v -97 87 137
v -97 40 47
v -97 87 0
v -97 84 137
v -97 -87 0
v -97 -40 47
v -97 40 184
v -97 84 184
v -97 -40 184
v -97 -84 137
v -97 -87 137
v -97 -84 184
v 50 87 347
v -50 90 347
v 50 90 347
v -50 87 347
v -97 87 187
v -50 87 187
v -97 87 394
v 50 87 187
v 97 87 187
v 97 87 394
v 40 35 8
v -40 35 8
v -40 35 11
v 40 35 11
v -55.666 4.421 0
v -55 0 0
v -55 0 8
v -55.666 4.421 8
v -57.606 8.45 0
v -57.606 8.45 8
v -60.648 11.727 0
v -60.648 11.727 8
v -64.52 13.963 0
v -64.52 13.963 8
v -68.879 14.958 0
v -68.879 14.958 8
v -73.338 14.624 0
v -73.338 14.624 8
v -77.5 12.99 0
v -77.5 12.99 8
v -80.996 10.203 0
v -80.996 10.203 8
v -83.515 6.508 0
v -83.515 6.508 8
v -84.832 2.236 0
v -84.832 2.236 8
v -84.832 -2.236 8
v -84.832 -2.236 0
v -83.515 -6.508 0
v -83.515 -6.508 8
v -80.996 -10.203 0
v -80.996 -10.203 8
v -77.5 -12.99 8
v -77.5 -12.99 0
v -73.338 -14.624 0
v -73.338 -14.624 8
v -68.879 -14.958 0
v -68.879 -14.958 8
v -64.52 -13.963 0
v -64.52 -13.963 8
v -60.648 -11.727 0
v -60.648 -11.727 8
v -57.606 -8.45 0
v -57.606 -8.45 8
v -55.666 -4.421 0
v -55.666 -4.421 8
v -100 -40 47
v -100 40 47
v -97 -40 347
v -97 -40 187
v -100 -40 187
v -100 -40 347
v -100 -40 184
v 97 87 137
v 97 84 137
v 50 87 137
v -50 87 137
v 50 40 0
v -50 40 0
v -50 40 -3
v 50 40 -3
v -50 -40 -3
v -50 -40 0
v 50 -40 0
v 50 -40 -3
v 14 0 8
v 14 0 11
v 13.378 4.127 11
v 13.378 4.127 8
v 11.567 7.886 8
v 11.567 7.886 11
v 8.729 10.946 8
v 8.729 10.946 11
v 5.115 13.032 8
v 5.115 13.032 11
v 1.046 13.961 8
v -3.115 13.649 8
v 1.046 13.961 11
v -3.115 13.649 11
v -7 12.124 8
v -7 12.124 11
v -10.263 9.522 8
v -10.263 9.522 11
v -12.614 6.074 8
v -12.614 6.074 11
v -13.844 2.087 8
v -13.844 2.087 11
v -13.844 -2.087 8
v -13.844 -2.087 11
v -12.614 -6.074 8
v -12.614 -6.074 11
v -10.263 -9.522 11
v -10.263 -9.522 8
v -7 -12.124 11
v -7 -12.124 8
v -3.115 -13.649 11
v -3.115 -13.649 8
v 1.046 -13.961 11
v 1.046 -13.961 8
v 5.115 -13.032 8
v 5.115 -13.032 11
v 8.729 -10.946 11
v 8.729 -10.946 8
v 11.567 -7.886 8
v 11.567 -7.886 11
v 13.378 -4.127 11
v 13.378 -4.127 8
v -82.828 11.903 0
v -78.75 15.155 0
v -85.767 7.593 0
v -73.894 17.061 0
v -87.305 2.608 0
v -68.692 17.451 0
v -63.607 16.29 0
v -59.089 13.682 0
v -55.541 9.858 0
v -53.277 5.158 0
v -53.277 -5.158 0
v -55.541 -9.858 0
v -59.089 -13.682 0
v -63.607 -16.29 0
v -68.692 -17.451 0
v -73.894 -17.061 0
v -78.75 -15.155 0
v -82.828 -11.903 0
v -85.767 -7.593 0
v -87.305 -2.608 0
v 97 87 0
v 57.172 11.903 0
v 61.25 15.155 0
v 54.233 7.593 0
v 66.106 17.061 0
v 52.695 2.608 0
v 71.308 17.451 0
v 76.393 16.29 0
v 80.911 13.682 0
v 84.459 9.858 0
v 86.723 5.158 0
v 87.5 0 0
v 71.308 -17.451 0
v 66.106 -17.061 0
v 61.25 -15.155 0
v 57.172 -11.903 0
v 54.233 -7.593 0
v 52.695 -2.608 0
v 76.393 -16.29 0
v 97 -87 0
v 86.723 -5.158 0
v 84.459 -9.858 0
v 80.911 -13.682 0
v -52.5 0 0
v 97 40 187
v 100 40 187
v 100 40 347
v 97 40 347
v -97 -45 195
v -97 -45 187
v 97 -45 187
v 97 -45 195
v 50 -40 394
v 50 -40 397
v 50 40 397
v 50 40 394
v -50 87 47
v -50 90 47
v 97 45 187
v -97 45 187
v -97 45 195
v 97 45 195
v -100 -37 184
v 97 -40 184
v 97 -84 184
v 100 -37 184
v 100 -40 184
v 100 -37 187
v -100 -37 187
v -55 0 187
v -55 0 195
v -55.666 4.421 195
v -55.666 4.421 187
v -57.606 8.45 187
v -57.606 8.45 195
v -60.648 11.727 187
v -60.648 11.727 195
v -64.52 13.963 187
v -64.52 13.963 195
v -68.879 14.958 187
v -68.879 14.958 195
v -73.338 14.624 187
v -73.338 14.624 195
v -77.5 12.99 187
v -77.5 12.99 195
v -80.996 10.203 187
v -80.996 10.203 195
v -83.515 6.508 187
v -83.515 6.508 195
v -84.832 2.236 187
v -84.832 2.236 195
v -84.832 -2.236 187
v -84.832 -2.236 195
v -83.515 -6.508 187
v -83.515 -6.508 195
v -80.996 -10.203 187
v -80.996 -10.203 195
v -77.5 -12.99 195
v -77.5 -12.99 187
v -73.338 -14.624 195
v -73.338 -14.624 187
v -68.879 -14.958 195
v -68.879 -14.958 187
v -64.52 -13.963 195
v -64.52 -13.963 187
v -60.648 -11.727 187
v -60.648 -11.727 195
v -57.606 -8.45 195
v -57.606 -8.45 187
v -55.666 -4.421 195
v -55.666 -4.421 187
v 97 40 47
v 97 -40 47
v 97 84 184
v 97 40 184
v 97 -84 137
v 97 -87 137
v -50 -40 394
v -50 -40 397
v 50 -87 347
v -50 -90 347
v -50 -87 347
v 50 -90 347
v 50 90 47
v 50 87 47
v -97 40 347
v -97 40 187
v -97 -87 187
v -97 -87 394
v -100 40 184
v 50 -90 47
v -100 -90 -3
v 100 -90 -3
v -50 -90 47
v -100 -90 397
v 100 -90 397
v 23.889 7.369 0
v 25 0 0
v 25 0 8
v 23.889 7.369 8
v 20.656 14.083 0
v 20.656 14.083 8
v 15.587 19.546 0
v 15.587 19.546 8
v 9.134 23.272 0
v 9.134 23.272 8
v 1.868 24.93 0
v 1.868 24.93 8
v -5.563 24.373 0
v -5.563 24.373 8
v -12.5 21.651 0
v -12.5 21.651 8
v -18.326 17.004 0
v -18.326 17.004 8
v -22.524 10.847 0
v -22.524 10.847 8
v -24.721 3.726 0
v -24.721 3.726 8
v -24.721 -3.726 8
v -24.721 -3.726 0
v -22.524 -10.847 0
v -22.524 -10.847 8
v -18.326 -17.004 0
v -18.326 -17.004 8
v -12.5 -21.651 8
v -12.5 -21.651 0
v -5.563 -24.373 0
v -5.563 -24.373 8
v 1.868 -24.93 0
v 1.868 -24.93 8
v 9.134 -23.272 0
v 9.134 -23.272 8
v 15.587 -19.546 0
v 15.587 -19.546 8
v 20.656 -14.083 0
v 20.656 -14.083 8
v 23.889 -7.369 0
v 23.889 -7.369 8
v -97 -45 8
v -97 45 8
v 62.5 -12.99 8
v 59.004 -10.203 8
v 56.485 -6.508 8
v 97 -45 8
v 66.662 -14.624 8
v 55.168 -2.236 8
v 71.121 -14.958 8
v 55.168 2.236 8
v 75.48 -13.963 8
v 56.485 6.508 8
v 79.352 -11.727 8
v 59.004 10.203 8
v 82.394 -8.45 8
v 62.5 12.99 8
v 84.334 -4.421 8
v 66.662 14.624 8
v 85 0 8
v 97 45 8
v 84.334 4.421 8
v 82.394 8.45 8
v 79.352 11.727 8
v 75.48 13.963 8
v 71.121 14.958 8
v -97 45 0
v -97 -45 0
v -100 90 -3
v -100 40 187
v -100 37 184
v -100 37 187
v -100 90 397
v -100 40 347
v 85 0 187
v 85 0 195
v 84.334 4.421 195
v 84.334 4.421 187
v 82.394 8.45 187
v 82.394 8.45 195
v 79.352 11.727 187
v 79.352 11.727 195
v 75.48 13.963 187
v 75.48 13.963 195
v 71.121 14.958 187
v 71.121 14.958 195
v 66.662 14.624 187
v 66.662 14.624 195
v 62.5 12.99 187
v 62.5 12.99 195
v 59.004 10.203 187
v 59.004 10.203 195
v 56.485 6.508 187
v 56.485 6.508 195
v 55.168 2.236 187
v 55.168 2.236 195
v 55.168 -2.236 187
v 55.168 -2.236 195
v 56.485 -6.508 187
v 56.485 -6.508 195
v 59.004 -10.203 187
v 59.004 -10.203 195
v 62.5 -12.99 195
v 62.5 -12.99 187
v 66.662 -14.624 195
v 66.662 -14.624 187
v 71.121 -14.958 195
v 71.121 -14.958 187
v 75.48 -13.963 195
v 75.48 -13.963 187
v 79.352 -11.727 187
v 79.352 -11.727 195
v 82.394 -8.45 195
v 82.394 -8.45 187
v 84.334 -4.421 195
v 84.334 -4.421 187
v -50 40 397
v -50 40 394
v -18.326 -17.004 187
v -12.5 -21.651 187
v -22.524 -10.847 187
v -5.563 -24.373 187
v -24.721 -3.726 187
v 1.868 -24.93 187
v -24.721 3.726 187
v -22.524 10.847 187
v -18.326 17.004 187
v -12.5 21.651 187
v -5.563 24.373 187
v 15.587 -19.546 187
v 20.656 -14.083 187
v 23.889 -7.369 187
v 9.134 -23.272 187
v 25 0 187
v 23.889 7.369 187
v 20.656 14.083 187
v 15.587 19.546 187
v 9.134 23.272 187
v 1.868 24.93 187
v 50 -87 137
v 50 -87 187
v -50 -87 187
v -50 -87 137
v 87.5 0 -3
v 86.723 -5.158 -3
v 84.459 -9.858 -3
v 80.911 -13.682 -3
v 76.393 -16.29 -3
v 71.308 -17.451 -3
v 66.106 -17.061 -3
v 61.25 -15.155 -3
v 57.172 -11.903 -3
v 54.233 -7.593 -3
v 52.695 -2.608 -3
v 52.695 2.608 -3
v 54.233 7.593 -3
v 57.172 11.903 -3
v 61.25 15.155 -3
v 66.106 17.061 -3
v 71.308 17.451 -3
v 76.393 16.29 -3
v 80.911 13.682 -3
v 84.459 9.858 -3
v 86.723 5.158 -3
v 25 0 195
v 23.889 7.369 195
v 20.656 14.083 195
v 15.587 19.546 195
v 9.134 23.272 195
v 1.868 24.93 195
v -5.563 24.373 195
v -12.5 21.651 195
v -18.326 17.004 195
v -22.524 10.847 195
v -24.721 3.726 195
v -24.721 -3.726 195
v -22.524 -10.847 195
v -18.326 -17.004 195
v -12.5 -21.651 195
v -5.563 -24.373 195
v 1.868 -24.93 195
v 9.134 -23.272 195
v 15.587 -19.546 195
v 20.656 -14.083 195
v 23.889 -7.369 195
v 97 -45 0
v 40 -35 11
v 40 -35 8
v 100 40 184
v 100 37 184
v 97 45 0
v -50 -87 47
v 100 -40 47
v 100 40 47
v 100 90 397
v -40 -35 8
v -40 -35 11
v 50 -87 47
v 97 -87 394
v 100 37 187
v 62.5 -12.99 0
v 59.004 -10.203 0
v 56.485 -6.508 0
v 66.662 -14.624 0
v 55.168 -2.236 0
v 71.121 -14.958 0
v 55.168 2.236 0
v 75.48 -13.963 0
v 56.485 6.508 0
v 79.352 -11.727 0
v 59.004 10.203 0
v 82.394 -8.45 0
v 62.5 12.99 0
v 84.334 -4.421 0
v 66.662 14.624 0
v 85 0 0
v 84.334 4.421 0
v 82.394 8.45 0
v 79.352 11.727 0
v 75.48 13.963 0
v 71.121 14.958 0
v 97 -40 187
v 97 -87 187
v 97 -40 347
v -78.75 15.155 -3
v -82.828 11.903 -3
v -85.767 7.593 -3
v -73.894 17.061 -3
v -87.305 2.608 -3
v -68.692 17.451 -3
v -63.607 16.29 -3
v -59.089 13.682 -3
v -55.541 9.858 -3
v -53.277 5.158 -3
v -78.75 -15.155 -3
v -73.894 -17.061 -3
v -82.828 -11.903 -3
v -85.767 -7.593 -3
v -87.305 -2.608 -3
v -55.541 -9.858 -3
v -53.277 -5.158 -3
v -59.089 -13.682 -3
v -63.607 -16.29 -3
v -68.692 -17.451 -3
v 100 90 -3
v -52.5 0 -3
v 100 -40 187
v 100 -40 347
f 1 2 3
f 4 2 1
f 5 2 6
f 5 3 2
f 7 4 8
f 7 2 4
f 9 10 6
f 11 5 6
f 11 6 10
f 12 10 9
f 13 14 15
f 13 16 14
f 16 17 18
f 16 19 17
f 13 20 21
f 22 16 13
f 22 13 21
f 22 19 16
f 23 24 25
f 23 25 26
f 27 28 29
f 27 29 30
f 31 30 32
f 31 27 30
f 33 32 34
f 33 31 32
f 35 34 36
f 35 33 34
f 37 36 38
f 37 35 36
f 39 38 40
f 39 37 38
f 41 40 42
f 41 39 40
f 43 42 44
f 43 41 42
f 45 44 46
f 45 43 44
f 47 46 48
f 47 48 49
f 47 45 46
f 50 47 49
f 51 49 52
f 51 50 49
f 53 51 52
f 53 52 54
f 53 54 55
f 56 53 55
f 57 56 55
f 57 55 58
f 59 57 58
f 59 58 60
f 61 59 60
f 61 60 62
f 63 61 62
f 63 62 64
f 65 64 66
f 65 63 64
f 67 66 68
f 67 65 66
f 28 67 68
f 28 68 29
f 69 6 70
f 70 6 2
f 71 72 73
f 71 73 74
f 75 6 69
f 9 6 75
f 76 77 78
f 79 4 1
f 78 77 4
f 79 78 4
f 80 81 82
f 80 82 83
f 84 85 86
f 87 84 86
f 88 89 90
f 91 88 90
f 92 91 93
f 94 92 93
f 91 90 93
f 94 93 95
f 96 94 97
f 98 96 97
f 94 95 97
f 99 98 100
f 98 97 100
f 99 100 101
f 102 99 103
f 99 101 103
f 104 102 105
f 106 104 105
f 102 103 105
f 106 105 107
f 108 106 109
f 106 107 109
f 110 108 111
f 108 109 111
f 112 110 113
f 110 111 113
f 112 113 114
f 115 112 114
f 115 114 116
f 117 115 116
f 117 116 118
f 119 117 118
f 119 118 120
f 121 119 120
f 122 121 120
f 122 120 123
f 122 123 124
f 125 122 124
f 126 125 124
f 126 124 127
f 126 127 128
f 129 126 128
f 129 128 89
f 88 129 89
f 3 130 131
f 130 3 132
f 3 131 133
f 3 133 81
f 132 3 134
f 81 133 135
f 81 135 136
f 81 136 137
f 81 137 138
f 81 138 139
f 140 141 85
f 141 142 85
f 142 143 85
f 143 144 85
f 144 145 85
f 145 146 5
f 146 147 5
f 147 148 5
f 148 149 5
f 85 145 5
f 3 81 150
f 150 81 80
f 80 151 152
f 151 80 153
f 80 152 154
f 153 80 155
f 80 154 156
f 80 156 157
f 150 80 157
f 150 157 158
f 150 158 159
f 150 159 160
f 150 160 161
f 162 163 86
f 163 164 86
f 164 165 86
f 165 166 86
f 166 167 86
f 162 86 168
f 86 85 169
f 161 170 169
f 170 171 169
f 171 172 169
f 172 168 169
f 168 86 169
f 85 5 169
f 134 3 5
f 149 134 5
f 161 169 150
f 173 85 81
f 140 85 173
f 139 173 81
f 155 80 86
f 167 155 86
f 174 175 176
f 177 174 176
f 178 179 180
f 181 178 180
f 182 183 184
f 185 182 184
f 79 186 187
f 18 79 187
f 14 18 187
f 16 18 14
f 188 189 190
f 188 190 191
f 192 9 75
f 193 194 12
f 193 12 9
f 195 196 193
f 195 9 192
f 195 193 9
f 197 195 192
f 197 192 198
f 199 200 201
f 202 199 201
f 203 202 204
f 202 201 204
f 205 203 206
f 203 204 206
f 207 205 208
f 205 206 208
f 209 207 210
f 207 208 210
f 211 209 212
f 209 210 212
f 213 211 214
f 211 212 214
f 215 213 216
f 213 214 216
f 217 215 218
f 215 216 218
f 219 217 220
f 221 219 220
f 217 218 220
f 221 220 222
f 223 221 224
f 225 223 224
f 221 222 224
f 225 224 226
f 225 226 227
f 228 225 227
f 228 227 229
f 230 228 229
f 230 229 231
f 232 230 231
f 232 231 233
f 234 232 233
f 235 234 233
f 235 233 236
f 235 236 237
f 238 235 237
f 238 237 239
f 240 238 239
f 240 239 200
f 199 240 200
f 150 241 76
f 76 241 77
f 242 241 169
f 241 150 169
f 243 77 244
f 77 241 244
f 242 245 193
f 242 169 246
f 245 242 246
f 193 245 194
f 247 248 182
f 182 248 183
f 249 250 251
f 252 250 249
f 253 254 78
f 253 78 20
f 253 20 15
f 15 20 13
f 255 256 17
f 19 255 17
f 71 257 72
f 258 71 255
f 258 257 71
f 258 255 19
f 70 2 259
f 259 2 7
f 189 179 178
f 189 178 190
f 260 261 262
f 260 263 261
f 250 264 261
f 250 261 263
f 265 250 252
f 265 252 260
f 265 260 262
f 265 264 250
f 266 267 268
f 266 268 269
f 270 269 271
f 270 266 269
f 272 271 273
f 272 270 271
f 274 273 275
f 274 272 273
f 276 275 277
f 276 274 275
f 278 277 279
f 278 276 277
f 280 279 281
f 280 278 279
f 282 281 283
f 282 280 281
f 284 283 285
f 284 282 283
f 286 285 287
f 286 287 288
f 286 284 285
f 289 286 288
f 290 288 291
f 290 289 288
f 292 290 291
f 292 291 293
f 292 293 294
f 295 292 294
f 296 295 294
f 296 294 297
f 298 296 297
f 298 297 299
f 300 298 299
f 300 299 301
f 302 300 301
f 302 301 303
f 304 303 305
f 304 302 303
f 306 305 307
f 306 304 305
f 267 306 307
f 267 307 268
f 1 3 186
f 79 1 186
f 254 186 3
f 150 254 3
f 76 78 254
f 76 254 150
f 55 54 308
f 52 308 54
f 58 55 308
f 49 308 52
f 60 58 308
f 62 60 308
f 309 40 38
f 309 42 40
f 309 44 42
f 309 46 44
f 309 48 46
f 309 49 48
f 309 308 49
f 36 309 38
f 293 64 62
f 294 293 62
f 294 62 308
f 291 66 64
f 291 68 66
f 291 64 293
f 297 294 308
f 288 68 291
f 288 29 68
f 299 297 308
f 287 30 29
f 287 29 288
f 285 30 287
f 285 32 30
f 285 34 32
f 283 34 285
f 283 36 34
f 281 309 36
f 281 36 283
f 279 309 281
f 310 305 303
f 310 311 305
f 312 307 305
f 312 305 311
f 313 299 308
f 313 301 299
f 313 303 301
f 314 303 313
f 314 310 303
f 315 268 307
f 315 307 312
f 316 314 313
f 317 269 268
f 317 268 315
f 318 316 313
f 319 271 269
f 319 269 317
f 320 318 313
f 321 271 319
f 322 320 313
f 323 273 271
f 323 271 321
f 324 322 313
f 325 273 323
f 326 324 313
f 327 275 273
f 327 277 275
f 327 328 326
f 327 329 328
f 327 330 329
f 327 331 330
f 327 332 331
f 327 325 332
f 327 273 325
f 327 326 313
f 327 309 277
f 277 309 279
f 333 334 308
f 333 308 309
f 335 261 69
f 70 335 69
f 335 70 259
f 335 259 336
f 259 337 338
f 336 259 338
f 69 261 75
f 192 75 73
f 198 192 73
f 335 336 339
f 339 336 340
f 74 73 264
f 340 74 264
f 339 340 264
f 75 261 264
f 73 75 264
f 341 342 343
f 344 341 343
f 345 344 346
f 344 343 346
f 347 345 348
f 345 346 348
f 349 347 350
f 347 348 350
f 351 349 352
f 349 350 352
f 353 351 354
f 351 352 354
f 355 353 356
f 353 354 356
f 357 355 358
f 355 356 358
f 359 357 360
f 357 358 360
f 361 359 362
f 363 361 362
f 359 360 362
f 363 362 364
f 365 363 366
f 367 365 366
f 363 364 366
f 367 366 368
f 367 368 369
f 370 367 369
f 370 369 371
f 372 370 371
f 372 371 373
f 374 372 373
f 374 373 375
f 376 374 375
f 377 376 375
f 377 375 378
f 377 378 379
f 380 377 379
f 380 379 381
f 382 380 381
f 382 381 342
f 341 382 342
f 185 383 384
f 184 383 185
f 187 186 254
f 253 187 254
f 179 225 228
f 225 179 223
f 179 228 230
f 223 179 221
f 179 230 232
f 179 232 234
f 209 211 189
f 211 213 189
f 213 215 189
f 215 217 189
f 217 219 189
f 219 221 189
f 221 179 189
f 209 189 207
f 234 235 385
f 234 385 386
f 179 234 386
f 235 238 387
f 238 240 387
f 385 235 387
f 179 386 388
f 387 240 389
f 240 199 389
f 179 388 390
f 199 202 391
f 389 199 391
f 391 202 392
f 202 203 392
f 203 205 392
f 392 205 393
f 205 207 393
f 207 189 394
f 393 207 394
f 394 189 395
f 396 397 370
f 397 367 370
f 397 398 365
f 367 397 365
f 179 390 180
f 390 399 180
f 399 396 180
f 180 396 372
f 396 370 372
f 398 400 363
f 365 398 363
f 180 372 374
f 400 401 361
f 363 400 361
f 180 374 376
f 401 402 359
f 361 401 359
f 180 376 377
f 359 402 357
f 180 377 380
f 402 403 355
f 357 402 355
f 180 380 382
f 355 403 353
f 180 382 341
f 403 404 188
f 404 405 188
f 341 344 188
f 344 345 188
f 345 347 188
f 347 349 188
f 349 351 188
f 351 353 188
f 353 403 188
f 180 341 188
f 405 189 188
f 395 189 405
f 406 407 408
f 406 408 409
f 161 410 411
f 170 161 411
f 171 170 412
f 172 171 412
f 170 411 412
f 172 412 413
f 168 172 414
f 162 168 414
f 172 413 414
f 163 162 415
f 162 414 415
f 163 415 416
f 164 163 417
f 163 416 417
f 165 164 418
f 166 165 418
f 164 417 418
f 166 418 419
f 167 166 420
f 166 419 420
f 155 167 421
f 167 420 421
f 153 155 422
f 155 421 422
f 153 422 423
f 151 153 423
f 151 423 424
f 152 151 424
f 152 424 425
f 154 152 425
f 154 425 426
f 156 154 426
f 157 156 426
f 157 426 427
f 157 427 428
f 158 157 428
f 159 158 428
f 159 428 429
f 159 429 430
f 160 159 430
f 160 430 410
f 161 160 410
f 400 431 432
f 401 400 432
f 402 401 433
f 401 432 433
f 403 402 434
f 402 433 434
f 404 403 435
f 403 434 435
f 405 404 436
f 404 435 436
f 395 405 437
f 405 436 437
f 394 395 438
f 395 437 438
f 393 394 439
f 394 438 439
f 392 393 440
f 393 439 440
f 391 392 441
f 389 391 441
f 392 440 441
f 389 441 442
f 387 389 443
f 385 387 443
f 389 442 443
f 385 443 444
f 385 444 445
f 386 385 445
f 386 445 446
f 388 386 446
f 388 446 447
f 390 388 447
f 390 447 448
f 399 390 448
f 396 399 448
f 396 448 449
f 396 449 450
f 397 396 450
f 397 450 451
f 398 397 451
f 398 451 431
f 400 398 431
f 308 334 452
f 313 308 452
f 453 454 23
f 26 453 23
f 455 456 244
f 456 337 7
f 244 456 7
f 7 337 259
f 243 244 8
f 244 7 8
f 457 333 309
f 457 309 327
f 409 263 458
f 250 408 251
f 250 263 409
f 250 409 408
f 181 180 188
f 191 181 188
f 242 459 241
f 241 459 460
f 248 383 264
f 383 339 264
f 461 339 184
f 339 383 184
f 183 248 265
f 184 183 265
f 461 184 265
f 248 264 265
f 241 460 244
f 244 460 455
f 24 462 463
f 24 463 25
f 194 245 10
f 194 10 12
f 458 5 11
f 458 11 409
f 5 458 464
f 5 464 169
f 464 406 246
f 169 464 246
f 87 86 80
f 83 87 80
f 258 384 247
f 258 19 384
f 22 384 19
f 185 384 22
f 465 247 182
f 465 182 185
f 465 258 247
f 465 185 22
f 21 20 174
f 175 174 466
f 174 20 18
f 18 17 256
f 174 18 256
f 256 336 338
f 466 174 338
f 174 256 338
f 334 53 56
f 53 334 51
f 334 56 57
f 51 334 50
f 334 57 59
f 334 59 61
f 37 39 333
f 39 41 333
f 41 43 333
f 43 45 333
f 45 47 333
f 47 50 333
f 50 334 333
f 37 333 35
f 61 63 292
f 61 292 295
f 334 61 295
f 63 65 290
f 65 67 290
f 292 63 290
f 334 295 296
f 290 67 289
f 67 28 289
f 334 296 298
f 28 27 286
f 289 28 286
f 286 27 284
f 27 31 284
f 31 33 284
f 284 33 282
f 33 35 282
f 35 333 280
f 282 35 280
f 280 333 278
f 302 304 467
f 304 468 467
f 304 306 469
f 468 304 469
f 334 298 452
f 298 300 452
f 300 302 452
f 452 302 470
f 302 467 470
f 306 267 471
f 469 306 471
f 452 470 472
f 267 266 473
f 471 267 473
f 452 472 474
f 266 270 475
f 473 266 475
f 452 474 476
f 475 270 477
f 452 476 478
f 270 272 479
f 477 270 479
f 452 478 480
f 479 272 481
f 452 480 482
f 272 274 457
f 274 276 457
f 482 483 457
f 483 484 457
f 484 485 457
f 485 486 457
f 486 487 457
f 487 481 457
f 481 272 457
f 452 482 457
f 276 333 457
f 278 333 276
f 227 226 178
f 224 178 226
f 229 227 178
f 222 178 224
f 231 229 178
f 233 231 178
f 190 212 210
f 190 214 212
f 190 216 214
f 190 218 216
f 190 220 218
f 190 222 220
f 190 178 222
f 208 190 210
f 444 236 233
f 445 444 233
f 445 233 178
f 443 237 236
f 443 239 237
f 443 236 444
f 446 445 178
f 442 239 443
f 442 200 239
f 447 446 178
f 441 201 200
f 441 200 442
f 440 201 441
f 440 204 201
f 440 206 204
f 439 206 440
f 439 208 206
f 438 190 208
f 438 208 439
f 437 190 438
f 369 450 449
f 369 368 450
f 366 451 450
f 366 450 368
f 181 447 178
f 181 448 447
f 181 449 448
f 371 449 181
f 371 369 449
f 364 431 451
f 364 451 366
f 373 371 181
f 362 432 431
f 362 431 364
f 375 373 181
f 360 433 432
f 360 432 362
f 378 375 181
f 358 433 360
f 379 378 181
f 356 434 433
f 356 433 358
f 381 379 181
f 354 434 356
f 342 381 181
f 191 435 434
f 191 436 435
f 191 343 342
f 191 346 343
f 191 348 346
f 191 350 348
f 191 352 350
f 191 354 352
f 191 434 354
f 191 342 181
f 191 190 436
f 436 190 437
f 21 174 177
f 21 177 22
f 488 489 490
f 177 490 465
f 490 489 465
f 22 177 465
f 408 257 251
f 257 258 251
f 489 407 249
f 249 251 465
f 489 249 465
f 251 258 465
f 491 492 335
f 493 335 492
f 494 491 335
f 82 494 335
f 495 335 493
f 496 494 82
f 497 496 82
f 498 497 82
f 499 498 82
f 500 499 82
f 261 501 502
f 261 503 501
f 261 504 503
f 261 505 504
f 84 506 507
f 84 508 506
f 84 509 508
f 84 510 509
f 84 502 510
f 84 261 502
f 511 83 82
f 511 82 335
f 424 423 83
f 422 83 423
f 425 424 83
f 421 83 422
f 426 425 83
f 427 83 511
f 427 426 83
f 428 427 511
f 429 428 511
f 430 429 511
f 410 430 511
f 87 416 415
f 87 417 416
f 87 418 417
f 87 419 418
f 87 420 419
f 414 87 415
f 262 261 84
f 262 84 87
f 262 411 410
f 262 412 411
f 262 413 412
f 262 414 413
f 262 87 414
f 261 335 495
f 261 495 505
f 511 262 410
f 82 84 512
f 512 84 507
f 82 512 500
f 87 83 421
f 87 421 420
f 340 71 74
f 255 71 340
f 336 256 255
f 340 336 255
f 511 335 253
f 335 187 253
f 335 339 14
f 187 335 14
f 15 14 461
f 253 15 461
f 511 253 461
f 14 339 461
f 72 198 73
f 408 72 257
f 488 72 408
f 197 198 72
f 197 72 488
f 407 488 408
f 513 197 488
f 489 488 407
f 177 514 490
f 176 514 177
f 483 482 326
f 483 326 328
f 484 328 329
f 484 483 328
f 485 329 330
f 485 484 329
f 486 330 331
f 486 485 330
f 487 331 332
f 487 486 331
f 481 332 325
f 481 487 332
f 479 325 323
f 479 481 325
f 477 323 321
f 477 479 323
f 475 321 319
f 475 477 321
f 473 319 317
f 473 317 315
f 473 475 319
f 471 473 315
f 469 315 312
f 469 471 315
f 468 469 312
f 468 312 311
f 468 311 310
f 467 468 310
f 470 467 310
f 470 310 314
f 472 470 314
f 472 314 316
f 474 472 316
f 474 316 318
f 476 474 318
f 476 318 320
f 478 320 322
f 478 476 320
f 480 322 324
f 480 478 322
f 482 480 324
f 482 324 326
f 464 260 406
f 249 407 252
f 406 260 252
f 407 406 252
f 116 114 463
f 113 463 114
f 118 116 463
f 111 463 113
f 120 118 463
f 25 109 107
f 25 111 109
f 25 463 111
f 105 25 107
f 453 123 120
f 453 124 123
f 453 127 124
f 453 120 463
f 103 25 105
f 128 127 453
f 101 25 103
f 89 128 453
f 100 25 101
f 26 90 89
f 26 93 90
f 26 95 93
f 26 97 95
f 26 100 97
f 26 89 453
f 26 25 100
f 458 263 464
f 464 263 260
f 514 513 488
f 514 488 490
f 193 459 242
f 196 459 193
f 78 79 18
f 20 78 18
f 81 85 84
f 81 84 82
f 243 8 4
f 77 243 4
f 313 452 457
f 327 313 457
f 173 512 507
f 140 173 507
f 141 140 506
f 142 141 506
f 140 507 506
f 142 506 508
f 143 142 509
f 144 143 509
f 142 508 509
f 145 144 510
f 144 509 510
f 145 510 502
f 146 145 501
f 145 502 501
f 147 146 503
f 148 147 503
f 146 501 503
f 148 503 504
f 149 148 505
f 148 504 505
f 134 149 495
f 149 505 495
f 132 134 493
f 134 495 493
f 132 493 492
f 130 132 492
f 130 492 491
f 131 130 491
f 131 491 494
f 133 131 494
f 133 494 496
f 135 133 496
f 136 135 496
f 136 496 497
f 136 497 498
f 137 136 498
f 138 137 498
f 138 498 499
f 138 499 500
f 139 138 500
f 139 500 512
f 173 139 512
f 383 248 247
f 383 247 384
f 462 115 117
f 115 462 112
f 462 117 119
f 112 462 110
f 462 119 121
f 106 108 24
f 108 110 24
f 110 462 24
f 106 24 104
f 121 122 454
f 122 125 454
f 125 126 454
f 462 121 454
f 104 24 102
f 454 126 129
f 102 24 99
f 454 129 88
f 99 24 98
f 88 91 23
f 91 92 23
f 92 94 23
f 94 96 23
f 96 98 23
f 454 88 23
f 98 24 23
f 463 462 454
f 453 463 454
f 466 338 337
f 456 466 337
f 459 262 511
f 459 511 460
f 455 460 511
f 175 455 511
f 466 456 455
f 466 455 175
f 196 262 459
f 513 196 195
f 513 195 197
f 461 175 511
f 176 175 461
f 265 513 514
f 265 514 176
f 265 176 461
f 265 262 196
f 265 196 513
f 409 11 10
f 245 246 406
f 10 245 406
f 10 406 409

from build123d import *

# Parameters (mm, degrees)
F0_W      = 194
F0_H      = 90
F0_R      = 15
F0_R_2    = 25
F1_DEPTH  = 8
F2_W      = 80
F2_H      = 70
F3_DEPTH  = 3
F4_R      = 14
F5_DEPTH  = 25
F6_W      = 200
F6_H      = 400
F7_DEPTH  = 90
F8_W      = 100
F8_H      = 300
F9_DEPTH  = 266
F10_T     = -3
F11_W     = 80
F11_H     = 300
F12_DEPTH = 162
F13_W     = 100
F13_H     = 80
F14_DEPTH = 517
F15_R     = 17.5
F16_DEPTH = 25
F18_DEPTH = 100
F19_W     = 194
F19_H     = 90
F20_DEPTH = 8
F21_R     = 25
F21_R_2   = 15
F22_DEPTH = 25


with BuildPart() as f1:
    # F0 (on Top) → F1 (new body)
    with BuildSketch(Plane.XY):
        Rectangle(F0_W, F0_H)
        with Locations((-70, 0)):
            Circle(F0_R, mode=Mode.SUBTRACT)
        Circle(F0_R_2, mode=Mode.SUBTRACT)
        with Locations((70, 0)):
            Circle(F0_R, mode=Mode.SUBTRACT)
    extrude(amount=F1_DEPTH)


with BuildPart() as f3:
    # F2 (on face) → F3 (new body)
    with BuildSketch(Plane.XY.offset(8)):
        Rectangle(F2_W, F2_H)
    extrude(amount=F3_DEPTH)

    # F4 (on face) → F5 (cut)
    with BuildSketch(Plane.XY.offset(11)):
        Circle(F4_R)
    extrude(amount=-F5_DEPTH, mode=Mode.SUBTRACT)


with BuildPart() as f7:
    # F6 (on Front) → F7 (new body, symmetric)
    with BuildSketch(Plane.XZ):
        with Locations((0, 197)):
            Rectangle(F6_W, F6_H)
    extrude(amount=F7_DEPTH, both=True)

    # F8 (on face) → F9 (cut)
    with BuildSketch(Plane.XZ.offset(90)):
        with Locations((0, 197)):
            Rectangle(F8_W, F8_H)
    extrude(amount=-F9_DEPTH, mode=Mode.SUBTRACT)

    # F10
    f10_openings = [f7.faces().sort_by_distance(p)[0] for p in [
        (50, 0, 197),
        (0, 0, 347),
        (-50, 0, 197),
        (0, 0, 47),
    ]]
    offset(amount=F10_T, openings=f10_openings)

    # F11 (on Right) → F12 (cut, symmetric)
    with BuildSketch(Plane.YZ):
        with Locations((0, 197)):
            Rectangle(F11_W, F11_H)
    extrude(amount=F12_DEPTH, both=True, mode=Mode.SUBTRACT)

    # F13 (on face) → F14 (cut)
    with BuildSketch(Plane.XY.offset(397)):
        Rectangle(F13_W, F13_H)
    extrude(amount=-F14_DEPTH, mode=Mode.SUBTRACT)

    # F15 (on face) → F16 (cut)
    with BuildSketch(Plane(origin=(0, 0, -3), x_dir=(1, 0, 0), z_dir=(0, 0, -1))):
        with Locations((70, 0)):
            Circle(F15_R)
        with Locations((-70, 0)):
            Circle(F15_R)
    extrude(amount=-F16_DEPTH, mode=Mode.SUBTRACT)

    # F17 (on Right) → F18 (join, symmetric)
    with BuildSketch(Plane.YZ):
        Polygon((84, 184), (84, 137), (87, 137), (87, 187), (37, 187), (37, 184), align=None)
        Polygon((-87, 137), (-84, 137), (-84, 184), (-37, 184), (-37, 187), (-87, 187), align=None)
    extrude(amount=F18_DEPTH, both=True)


with BuildPart() as f20:
    # F19 (on face) → F20 (new body)
    with BuildSketch(Plane.XY.offset(187)):
        Rectangle(F19_W, F19_H)
    extrude(amount=F20_DEPTH)

    # F21 (on face) → F22 (cut)
    with BuildSketch(Plane.XY.offset(195)):
        Circle(F21_R)
        with Locations((70, 0)):
            Circle(F21_R_2)
        with Locations((-70, 0)):
            Circle(F21_R_2)
    extrude(amount=-F22_DEPTH, mode=Mode.SUBTRACT)


solid = Compound([f1.part, f3.part, f7.part, f20.part])
